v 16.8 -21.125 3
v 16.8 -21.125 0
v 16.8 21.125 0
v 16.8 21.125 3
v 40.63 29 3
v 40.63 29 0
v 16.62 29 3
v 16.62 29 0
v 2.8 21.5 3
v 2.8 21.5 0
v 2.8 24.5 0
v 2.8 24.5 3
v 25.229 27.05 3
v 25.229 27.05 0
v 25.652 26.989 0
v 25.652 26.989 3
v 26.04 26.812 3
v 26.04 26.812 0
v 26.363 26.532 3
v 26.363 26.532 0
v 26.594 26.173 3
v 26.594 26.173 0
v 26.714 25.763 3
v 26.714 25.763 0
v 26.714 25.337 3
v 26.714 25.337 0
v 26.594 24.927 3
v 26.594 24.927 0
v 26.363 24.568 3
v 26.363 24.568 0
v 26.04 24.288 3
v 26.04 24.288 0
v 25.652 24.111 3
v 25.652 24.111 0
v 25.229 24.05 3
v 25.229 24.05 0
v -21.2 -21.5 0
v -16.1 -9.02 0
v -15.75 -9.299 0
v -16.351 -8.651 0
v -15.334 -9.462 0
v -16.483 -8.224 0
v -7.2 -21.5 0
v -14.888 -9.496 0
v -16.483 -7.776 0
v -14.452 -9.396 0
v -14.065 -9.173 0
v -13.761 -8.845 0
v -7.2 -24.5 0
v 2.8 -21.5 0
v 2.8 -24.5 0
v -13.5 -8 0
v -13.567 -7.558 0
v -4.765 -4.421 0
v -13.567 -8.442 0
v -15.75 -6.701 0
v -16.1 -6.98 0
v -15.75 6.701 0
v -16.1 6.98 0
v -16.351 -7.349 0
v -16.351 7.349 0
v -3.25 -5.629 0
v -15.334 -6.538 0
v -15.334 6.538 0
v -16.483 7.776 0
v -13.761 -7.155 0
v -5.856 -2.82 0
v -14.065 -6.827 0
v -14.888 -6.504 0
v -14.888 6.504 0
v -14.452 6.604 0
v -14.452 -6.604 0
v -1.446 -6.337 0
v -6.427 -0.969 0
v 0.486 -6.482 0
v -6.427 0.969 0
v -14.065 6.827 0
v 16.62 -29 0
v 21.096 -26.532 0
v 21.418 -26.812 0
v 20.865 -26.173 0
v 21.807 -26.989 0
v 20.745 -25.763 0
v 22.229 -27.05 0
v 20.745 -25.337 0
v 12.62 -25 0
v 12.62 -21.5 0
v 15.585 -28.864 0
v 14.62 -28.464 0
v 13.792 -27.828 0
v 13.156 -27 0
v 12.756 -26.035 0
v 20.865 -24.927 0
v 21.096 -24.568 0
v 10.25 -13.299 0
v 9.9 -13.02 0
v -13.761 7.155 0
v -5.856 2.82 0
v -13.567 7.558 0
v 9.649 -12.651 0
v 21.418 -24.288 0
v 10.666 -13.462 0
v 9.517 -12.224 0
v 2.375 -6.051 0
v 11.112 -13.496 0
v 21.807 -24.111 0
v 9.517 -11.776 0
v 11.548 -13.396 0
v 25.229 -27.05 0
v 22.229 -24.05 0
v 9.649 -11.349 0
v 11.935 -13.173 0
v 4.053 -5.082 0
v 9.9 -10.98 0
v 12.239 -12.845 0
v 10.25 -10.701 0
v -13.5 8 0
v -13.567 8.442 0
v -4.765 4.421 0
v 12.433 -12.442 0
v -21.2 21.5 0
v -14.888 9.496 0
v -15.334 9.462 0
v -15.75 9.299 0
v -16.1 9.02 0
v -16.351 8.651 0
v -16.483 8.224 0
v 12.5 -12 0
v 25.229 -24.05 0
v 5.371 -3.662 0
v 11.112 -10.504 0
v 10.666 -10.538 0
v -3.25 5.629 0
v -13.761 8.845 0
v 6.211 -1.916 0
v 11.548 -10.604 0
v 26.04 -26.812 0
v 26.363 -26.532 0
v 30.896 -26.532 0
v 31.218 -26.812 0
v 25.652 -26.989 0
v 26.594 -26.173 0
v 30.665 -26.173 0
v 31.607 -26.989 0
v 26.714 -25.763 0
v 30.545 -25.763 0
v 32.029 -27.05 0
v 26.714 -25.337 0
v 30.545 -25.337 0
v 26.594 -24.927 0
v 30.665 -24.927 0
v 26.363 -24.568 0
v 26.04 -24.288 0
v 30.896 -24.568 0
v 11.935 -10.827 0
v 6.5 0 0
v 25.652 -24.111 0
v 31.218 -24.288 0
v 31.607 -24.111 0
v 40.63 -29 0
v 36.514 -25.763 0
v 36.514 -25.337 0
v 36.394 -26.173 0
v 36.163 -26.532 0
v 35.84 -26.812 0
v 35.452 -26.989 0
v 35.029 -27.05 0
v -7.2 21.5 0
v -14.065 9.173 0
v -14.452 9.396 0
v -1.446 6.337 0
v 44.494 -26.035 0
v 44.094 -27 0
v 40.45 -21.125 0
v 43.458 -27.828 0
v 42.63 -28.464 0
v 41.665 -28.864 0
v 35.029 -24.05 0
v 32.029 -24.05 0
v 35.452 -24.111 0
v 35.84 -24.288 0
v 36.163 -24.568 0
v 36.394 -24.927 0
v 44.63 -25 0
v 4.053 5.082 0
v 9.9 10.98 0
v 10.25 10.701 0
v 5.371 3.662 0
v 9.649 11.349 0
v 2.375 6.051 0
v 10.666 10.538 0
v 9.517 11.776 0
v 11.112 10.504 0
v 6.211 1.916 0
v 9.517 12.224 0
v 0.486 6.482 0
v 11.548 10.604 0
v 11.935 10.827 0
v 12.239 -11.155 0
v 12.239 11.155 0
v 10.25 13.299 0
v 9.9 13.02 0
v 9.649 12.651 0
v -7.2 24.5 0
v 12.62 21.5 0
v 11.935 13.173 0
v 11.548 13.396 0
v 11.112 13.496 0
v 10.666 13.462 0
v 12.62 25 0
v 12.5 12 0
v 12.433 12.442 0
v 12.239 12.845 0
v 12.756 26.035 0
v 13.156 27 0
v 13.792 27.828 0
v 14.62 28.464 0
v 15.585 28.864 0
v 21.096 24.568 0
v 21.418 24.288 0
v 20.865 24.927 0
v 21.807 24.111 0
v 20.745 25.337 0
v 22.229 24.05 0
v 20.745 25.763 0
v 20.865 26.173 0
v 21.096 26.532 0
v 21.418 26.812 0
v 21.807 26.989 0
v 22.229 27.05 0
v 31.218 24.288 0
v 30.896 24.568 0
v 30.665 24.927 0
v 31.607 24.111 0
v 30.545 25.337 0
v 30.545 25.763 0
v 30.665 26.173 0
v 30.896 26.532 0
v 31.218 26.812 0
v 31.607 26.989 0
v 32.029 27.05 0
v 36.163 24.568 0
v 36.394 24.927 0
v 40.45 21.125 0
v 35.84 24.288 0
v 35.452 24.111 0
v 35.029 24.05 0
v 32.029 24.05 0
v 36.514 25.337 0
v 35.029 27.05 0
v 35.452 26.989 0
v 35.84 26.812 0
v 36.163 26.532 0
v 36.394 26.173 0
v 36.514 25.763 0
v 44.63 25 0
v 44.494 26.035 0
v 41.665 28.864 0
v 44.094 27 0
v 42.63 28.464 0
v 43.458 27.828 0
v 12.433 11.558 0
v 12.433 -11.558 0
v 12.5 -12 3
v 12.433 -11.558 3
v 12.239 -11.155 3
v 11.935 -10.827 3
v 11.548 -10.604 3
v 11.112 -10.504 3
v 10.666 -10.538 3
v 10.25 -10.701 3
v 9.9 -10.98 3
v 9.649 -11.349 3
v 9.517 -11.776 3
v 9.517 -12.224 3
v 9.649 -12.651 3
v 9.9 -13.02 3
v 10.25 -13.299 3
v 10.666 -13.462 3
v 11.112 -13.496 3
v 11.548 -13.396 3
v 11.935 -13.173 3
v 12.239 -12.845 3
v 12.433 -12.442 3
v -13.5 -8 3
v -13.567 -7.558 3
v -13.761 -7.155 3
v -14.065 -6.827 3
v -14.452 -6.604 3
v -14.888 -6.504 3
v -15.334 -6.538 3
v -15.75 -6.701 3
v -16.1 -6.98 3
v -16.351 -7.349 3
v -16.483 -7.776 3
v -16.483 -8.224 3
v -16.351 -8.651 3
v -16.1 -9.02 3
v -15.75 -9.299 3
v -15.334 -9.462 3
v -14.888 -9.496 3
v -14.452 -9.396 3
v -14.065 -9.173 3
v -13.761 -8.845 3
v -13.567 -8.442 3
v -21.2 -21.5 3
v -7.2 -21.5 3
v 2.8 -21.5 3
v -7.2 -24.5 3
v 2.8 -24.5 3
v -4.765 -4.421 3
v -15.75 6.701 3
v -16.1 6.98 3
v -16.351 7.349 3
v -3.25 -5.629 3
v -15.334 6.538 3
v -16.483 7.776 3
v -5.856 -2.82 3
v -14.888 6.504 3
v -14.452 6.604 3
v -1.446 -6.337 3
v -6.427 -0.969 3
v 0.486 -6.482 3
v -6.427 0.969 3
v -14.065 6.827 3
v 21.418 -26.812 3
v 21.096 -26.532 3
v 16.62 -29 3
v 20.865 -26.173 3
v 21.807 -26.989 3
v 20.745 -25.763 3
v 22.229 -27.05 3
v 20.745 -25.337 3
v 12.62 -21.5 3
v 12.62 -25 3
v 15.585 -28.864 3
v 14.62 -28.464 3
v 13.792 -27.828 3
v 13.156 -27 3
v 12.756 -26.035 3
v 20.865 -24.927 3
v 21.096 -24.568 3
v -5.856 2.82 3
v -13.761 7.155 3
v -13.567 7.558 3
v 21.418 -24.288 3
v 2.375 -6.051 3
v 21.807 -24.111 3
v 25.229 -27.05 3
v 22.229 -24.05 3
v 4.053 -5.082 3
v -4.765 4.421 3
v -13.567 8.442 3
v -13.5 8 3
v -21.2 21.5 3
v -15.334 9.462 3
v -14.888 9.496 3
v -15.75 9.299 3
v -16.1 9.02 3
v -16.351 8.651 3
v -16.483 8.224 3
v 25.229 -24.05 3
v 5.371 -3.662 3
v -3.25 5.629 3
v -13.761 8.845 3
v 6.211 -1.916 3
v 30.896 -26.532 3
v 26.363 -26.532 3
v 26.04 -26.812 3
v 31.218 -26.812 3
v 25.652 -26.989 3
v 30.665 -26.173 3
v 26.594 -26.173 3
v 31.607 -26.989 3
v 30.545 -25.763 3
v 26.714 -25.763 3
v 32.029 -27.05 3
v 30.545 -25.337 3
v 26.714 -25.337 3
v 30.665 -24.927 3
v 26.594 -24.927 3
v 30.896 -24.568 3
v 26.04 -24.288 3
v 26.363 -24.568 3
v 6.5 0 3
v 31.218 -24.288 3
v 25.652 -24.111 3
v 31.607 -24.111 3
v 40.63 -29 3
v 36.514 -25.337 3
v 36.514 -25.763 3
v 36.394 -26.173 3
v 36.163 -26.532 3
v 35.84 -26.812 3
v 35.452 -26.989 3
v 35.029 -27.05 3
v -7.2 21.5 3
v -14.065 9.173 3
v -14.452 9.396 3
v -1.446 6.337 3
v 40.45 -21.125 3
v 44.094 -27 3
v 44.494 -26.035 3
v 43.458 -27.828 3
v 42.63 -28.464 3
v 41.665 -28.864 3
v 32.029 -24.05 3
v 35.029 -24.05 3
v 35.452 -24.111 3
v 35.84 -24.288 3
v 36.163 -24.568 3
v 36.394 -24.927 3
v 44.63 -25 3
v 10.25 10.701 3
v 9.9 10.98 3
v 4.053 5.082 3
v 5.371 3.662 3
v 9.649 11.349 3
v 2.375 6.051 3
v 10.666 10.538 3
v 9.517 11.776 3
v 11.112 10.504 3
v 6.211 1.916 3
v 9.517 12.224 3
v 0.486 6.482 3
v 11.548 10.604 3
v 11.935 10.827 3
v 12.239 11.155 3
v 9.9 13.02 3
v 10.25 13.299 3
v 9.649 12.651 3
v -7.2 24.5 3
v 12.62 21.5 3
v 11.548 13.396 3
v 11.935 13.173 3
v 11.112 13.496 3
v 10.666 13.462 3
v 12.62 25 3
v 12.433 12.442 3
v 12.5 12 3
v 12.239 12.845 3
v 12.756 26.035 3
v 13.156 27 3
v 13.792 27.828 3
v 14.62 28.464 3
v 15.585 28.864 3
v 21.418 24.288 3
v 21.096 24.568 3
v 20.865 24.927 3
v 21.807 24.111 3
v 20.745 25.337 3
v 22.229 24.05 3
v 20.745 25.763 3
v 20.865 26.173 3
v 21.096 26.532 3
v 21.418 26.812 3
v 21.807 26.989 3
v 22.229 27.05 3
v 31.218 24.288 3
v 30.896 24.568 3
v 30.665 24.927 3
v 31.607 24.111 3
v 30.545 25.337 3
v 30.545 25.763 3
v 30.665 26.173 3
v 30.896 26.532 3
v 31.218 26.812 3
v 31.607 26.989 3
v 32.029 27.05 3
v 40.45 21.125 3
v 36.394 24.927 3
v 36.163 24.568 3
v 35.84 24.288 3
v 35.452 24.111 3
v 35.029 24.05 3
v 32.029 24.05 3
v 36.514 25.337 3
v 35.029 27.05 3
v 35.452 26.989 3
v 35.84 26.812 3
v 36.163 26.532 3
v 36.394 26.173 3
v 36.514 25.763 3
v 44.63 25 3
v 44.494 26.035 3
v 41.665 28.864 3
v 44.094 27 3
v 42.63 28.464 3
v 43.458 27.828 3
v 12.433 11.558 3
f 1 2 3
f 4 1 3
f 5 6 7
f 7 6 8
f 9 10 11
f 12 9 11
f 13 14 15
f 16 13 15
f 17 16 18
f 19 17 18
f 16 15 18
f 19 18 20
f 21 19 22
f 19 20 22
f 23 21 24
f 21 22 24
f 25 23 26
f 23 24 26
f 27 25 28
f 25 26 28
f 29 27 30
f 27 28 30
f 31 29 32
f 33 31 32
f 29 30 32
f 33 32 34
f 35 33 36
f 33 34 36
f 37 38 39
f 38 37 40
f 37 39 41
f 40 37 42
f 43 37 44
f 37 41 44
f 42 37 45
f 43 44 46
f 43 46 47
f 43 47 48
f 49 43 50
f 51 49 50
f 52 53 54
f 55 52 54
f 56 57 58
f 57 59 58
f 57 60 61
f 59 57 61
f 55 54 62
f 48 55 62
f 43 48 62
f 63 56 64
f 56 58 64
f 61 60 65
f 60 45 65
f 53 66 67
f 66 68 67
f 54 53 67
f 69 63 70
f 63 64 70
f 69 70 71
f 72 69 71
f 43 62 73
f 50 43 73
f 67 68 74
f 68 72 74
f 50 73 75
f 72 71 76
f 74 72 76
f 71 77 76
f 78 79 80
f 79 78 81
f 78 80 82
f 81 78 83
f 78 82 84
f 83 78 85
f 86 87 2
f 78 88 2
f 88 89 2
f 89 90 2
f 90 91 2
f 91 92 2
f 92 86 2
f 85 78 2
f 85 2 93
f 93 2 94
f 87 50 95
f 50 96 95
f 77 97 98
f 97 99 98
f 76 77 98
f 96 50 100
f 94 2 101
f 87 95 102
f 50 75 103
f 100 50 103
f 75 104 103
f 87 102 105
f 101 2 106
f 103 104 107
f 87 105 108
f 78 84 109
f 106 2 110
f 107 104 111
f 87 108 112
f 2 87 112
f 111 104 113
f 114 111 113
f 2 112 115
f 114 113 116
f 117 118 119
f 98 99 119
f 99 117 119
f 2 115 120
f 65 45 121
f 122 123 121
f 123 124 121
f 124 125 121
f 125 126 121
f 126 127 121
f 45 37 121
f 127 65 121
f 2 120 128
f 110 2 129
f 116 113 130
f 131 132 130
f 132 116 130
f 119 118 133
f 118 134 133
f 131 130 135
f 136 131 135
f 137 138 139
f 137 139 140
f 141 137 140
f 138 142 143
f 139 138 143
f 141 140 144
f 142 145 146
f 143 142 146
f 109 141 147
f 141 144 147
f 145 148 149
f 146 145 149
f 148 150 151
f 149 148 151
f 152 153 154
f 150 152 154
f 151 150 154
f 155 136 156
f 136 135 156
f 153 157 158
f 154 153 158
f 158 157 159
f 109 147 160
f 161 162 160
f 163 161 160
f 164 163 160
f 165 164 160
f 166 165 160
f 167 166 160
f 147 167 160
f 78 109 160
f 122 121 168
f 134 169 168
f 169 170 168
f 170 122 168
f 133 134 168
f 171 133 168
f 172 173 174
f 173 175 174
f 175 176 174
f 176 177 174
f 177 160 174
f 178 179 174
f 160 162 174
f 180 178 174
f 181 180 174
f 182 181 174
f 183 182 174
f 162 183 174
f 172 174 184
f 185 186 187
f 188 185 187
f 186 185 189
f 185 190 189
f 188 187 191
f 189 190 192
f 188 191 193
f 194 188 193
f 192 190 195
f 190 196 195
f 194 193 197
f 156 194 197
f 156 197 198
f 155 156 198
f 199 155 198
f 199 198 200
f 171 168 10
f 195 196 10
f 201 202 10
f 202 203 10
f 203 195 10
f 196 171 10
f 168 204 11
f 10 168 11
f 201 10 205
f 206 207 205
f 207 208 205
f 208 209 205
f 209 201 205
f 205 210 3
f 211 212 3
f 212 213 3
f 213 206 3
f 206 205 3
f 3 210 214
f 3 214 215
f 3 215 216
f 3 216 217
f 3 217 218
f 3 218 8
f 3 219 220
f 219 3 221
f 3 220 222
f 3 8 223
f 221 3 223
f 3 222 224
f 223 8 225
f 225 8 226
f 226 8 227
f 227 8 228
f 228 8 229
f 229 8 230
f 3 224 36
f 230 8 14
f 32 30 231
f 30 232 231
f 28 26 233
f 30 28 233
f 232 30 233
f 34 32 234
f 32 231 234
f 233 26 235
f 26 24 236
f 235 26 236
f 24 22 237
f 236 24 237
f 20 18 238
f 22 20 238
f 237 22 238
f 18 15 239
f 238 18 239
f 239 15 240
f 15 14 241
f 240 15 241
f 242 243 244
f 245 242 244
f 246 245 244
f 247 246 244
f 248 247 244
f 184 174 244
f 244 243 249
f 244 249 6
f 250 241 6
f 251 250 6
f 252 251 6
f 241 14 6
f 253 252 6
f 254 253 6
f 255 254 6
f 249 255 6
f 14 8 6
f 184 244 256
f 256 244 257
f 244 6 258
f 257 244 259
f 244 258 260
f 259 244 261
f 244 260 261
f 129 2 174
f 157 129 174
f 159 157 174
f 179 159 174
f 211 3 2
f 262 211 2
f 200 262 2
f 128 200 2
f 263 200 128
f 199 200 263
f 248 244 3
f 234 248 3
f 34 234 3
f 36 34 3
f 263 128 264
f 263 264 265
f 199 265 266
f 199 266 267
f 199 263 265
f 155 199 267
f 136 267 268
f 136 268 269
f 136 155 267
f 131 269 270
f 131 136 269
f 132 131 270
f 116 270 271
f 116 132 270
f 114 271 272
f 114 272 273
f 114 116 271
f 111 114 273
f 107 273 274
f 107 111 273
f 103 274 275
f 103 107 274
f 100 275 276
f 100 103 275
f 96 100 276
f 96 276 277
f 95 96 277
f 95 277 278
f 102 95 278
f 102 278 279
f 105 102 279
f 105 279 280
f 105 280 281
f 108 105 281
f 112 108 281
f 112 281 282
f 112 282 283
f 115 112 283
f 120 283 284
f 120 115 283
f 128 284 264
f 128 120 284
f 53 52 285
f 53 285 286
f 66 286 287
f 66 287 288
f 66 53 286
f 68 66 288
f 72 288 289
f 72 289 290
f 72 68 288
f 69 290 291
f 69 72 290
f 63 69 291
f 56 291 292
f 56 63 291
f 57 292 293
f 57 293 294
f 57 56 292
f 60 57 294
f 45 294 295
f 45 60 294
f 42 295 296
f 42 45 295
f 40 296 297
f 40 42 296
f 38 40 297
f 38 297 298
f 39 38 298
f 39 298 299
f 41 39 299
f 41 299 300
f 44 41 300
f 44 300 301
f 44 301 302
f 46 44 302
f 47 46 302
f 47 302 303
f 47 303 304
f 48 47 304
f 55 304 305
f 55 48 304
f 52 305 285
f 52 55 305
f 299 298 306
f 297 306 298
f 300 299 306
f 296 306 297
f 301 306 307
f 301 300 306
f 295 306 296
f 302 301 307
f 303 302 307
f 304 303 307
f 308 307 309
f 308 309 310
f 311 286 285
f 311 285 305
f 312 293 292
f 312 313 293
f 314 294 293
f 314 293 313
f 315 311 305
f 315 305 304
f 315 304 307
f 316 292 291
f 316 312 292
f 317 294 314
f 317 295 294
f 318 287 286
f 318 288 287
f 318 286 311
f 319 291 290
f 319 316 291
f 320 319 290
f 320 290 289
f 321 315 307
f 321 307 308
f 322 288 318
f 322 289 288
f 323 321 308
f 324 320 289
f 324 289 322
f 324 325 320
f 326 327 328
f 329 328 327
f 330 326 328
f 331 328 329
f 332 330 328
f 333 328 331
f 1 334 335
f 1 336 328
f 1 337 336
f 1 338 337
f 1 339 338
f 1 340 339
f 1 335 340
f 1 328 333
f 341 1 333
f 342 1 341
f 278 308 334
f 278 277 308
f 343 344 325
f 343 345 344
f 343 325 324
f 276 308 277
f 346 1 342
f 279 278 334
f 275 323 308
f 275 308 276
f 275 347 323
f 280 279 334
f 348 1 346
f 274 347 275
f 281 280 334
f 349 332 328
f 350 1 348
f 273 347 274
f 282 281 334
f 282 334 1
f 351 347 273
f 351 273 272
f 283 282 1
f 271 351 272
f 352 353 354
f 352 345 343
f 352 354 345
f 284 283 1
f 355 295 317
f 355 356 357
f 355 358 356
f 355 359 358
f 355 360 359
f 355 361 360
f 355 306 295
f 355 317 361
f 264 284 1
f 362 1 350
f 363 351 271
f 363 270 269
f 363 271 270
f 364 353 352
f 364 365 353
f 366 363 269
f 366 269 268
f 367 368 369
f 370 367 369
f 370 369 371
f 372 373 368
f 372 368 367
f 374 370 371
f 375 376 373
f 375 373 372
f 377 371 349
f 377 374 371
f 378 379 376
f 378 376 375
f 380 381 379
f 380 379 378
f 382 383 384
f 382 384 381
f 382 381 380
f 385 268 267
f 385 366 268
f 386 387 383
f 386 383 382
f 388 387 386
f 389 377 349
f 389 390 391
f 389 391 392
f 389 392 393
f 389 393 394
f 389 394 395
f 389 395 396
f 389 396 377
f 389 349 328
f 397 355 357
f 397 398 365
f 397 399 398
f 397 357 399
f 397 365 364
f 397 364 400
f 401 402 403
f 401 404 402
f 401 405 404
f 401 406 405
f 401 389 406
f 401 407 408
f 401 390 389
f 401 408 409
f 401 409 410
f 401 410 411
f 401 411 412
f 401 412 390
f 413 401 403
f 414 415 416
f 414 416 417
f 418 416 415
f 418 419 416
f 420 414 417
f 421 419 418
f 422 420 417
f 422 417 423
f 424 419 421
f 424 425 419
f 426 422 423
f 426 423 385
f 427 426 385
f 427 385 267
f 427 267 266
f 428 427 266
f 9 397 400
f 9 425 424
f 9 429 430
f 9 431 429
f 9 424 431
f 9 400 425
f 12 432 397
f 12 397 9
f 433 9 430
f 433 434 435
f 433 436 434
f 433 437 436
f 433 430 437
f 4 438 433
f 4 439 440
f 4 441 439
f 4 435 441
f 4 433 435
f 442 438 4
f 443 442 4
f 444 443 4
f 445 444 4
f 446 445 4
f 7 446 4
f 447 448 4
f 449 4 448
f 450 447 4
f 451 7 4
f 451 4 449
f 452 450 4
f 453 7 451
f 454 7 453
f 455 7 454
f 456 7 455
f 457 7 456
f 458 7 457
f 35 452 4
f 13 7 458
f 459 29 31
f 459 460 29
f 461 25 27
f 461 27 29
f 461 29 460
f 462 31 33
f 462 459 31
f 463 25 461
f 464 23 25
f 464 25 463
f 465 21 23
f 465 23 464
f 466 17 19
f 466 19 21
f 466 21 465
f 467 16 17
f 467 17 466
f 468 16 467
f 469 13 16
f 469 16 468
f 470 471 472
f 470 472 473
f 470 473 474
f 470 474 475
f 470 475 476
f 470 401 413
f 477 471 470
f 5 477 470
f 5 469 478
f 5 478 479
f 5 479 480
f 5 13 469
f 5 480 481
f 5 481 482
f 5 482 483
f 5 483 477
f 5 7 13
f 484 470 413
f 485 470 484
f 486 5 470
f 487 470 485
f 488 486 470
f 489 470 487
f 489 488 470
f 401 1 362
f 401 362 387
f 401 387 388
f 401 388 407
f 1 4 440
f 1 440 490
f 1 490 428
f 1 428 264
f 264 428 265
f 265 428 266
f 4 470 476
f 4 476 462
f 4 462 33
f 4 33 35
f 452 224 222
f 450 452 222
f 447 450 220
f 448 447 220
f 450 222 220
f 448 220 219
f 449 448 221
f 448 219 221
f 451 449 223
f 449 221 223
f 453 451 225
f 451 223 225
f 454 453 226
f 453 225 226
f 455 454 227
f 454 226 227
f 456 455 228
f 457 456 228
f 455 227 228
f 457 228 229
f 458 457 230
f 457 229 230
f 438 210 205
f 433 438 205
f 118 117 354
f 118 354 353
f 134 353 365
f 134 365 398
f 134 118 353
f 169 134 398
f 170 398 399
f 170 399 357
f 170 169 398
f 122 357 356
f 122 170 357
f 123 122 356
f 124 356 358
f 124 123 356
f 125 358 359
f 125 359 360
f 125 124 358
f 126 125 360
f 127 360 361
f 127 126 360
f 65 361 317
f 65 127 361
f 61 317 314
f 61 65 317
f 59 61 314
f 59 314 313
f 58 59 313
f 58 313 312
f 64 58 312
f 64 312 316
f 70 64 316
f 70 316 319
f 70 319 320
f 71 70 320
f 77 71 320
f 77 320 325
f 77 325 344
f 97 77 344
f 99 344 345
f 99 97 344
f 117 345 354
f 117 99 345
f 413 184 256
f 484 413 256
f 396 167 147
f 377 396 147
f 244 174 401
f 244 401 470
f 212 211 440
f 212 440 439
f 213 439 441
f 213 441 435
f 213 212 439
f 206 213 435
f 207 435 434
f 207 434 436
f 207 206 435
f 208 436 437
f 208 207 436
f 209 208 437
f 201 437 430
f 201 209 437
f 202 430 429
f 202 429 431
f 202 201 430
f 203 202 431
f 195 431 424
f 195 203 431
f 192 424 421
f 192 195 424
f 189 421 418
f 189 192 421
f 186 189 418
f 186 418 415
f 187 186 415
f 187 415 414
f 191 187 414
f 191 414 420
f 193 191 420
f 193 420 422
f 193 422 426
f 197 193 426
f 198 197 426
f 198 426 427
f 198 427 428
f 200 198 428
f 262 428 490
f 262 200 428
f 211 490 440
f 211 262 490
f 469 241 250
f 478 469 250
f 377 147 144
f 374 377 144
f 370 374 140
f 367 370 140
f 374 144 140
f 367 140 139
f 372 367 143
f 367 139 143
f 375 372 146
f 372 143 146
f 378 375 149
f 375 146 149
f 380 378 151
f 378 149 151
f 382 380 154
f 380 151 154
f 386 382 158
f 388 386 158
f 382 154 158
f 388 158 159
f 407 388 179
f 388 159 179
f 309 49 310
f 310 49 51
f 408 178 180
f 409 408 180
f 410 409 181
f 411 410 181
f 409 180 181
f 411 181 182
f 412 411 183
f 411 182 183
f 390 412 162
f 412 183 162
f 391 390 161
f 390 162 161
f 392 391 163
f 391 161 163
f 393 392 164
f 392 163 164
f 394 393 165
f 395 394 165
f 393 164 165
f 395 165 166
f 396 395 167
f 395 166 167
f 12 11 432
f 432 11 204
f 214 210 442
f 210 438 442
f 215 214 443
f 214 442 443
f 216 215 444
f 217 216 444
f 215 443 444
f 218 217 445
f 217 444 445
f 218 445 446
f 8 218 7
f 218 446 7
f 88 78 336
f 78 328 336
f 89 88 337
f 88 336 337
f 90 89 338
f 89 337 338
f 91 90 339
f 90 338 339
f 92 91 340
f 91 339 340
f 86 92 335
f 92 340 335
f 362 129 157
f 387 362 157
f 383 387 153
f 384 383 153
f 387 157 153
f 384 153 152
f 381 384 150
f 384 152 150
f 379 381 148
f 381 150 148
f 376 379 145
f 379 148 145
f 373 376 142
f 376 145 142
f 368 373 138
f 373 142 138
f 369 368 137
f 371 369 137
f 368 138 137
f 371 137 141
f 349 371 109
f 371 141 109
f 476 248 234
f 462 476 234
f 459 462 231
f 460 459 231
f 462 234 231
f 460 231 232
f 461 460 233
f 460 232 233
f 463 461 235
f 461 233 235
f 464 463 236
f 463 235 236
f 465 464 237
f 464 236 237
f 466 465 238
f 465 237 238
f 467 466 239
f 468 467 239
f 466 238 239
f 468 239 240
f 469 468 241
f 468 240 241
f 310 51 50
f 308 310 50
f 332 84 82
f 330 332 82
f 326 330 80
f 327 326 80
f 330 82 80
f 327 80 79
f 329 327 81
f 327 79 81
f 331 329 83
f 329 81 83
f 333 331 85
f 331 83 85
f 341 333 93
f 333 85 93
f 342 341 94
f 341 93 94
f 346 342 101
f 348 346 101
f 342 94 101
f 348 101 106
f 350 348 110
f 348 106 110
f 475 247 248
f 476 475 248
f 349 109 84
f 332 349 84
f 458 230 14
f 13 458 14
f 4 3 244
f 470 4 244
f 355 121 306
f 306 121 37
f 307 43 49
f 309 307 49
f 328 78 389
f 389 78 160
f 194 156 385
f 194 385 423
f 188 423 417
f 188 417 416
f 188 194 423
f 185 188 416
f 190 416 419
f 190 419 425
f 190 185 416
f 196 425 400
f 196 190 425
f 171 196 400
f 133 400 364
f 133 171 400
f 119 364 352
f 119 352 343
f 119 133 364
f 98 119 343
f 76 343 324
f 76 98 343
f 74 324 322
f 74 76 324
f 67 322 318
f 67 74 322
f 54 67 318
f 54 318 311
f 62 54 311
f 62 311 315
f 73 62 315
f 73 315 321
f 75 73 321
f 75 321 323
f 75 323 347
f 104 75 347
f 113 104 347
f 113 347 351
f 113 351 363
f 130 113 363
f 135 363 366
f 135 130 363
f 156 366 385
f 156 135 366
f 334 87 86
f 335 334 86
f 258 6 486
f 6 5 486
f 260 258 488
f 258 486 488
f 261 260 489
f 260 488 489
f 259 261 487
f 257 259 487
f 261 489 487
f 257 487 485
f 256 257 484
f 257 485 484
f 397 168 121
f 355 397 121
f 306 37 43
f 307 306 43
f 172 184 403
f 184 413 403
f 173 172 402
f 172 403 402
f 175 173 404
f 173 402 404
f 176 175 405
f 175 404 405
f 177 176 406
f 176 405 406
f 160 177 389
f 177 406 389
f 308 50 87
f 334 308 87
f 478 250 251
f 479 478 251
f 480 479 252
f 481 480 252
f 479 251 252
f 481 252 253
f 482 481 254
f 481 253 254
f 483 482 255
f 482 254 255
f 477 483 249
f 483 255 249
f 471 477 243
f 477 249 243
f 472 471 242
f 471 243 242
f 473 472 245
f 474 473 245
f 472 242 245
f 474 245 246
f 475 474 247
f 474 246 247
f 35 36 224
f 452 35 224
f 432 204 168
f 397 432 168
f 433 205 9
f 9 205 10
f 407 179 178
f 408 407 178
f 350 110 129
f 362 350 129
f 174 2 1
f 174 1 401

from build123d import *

# Parameters (mm, degrees)
SKETCH1_R           = 1.5
SKETCH1_R_2         = 6.5
SKETCH1_W           = 23.65
SKETCH1_H           = 42.25
BOSS_EXTRUDE1_DEPTH = 3
FILLET1_R           = 4


with BuildPart() as part:
    # Sketch1 → Boss-Extrude1 (new body)
    with BuildSketch(Plane.XY):
        Polygon((12.62, 29), (12.62, 21.5), (2.8, 21.5), (2.8, 24.5), (-7.2, 24.5), (-7.2, 21.5), (-21.2, 21.5), (-21.2, -21.5), (-7.2, -21.5), (-7.2, -24.5), (2.8, -24.5), (2.8, -21.5), (12.62, -21.5), (12.62, -29), (44.63, -29), (44.63, 29), align=None)
        with Locations((-15, -8)):
            Circle(SKETCH1_R, mode=Mode.SUBTRACT)
        with Locations((-15, 8)):
            Circle(SKETCH1_R, mode=Mode.SUBTRACT)
        with Locations((11, 12)):
            Circle(SKETCH1_R, mode=Mode.SUBTRACT)
        with Locations((11, -12)):
            Circle(SKETCH1_R, mode=Mode.SUBTRACT)
        Circle(SKETCH1_R_2, mode=Mode.SUBTRACT)
        with BuildLine():
            Line((22.229319933, 27.05), (25.229319933, 27.05))
            ThreePointArc((25.229319933, 27.05), (26.729319933, 25.55), (25.229319933, 24.05))
            Line((25.229319933, 24.05), (22.229319933, 24.05))
            ThreePointArc((22.229319933, 24.05), (20.729319933, 25.55), (22.229319933, 27.05))
        make_face(mode=Mode.SUBTRACT)
        with BuildLine():
            Line((32.029319933, 27.05), (35.029319933, 27.05))
            ThreePointArc((35.029319933, 27.05), (36.529319933, 25.55), (35.029319933, 24.05))
            Line((35.029319933, 24.05), (32.029319933, 24.05))
            ThreePointArc((32.029319933, 24.05), (30.529319933, 25.55), (32.029319933, 27.05))
        make_face(mode=Mode.SUBTRACT)
        with BuildLine():
            Line((22.229319933, -24.05), (25.229319933, -24.05))
            ThreePointArc((25.229319933, -24.05), (26.729319933, -25.55), (25.229319933, -27.05))
            Line((25.229319933, -27.05), (22.229319933, -27.05))
            ThreePointArc((22.229319933, -27.05), (20.729319933, -25.55), (22.229319933, -24.05))
        make_face(mode=Mode.SUBTRACT)
        with Locations((28.625, 0)):
            Rectangle(SKETCH1_W, SKETCH1_H, mode=Mode.SUBTRACT)
        with BuildLine():
            Line((32.029319933, -24.05), (35.029319933, -24.05))
            ThreePointArc((35.029319933, -24.05), (36.529319933, -25.55), (35.029319933, -27.05))
            Line((35.029319933, -27.05), (32.029319933, -27.05))
            ThreePointArc((32.029319933, -27.05), (30.529319933, -25.55), (32.029319933, -24.05))
        make_face(mode=Mode.SUBTRACT)
    extrude(amount=BOSS_EXTRUDE1_DEPTH)

    # Fillet1
    fillet1_edges = [part.edges().sort_by_distance(p)[0] for p in [
        (12.62, 29, 1.5),
        (44.63, 29, 1.5),
        (44.63, -29, 1.5),
        (12.62, -29, 1.5),
    ]]
    fillet(fillet1_edges, radius=FILLET1_R)


solid = part.part
